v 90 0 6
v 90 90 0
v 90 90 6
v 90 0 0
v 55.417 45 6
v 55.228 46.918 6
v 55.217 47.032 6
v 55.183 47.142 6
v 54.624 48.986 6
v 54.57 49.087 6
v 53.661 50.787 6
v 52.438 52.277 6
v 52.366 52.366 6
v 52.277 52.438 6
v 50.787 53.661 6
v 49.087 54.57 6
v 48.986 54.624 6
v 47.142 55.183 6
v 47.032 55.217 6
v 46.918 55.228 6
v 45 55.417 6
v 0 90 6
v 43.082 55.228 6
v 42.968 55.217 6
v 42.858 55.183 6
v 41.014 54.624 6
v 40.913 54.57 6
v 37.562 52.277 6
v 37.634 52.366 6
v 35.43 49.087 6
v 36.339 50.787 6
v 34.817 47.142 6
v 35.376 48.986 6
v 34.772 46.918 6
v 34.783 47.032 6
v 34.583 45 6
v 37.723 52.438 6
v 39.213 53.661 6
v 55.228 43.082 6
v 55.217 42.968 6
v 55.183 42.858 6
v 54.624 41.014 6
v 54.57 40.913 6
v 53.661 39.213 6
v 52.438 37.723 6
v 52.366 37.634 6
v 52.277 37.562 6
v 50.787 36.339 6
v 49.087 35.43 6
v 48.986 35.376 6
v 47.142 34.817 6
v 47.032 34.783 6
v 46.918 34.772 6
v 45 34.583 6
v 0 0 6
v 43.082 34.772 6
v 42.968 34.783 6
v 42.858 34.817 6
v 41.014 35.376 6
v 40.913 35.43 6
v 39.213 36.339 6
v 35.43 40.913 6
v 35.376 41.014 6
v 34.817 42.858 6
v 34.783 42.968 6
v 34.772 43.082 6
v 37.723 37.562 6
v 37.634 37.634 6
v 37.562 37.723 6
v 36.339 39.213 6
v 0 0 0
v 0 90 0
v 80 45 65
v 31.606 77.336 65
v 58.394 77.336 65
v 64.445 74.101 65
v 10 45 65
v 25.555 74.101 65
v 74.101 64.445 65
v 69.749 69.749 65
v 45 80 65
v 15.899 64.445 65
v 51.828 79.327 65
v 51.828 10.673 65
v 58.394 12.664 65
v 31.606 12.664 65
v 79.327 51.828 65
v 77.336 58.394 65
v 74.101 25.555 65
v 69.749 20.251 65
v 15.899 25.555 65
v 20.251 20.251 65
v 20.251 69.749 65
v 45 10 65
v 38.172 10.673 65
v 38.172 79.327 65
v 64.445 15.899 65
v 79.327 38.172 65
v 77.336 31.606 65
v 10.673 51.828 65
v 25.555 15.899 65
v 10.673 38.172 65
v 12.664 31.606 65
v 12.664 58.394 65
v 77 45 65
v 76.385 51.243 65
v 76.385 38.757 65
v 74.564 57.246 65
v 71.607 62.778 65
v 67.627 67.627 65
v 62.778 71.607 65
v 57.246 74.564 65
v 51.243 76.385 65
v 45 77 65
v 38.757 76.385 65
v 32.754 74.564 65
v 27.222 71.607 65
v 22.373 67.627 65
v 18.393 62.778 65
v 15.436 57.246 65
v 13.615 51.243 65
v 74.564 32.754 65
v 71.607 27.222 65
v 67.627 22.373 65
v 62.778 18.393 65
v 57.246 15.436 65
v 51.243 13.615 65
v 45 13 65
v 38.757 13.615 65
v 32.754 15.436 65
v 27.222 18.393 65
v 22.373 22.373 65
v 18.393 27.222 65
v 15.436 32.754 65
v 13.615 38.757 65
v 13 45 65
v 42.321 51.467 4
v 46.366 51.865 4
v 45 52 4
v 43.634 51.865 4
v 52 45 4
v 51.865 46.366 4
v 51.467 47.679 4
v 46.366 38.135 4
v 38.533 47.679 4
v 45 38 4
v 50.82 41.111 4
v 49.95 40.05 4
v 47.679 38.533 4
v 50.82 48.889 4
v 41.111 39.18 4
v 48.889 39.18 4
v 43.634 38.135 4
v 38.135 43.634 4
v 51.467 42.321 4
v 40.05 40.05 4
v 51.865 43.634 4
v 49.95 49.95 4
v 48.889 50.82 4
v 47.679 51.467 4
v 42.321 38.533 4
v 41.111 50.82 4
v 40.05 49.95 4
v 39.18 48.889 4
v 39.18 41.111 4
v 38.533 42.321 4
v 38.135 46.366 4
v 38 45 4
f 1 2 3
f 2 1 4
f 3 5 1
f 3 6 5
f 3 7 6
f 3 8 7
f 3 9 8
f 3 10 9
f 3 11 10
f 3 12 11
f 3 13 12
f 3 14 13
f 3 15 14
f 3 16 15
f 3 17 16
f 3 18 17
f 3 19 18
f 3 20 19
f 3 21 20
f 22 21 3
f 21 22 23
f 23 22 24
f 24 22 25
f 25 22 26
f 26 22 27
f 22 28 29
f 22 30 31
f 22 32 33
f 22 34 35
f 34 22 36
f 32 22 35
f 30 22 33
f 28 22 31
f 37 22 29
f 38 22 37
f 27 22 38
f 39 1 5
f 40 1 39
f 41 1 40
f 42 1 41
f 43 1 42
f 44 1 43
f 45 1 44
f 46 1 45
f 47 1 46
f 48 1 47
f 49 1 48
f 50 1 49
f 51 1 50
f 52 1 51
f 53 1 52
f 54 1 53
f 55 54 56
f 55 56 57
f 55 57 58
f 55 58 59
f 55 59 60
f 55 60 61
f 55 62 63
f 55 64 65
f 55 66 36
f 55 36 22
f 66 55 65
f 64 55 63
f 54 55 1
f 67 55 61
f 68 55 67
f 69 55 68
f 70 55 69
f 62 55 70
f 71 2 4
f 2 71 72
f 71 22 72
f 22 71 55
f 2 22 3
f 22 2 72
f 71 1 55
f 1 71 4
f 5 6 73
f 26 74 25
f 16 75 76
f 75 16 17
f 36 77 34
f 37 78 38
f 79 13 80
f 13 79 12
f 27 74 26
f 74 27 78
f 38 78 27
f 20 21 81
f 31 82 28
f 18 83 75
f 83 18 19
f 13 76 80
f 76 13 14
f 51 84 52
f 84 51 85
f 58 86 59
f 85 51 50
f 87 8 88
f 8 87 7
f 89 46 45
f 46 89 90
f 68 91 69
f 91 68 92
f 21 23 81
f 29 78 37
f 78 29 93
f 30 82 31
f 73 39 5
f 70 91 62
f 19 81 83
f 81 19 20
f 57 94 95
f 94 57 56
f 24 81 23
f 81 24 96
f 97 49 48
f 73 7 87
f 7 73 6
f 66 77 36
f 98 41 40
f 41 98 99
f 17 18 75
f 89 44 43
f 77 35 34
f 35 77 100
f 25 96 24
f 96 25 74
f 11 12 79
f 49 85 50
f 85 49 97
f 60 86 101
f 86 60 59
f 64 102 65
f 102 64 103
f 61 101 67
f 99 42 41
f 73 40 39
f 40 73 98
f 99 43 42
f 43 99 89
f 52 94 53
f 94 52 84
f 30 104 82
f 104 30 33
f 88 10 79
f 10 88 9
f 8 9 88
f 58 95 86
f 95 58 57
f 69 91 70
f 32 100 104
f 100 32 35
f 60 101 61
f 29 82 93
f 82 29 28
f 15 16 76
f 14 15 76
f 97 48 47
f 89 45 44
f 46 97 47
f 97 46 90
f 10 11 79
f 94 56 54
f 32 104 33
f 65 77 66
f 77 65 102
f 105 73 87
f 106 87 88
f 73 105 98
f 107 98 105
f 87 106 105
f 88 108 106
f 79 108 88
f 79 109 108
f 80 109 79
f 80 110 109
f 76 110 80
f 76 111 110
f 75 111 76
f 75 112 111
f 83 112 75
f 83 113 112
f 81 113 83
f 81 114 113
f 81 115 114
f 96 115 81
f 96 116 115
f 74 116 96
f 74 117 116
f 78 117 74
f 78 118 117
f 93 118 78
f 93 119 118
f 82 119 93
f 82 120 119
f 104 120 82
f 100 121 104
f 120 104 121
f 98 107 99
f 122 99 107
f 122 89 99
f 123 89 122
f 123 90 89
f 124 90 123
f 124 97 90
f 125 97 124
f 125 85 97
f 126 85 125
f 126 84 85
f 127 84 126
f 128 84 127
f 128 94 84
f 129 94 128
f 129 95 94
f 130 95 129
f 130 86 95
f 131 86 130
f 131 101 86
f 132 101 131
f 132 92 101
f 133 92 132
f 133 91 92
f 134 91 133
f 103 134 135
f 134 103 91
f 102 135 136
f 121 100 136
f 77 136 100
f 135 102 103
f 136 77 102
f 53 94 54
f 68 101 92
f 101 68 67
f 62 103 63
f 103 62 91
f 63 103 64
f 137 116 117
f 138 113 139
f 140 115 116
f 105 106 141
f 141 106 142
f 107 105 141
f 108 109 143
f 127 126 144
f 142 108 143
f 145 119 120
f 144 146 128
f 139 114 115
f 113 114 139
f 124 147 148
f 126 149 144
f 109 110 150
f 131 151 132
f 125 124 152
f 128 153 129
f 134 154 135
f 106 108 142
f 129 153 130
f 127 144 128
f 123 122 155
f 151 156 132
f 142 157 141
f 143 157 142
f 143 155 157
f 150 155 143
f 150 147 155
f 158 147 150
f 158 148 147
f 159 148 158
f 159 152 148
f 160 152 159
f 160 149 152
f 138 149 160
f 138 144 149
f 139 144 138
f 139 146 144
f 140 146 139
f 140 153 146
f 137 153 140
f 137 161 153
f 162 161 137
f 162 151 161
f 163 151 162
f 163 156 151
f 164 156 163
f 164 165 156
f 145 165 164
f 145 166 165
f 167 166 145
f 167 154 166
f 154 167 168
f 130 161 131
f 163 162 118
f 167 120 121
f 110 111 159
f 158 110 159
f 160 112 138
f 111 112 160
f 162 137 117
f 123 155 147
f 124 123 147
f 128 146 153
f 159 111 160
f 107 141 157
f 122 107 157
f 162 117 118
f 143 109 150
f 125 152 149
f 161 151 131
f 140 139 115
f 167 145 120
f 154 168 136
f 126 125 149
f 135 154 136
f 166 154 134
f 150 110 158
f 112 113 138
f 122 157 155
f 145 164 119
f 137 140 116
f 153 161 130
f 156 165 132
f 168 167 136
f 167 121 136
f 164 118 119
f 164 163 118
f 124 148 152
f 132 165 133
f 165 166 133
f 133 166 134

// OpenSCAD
$fn = 32;

// ----------------------------------------------------------------------
// Hopper: funnel with square flange
// ----------------------------------------------------------------------

// --- parameters (mm) ---
fl = 90;                  // flange side, X and Y
fl_t = 6;                 // flange thickness
cone_h = 60;              // cone height above the flange
top_d = 70;               // cone mouth diameter
bot_d = 20;               // cone spout diameter
wall = 3;                 // cone wall thickness

bore_d = bot_d - 2 * wall;  // spout bore diameter
total_h = fl_t + cone_h - 1;  // overall height

difference() {
  union() {
    cube([fl, fl, fl_t]);
    translate([fl / 2, fl / 2, fl_t - 1])
      cylinder(h = cone_h, d1 = bot_d, d2 = top_d);
  }
  translate([fl / 2, fl / 2, fl_t - 2])
    cylinder(h = cone_h + 1, d1 = bore_d, d2 = top_d - 2 * wall);
}
